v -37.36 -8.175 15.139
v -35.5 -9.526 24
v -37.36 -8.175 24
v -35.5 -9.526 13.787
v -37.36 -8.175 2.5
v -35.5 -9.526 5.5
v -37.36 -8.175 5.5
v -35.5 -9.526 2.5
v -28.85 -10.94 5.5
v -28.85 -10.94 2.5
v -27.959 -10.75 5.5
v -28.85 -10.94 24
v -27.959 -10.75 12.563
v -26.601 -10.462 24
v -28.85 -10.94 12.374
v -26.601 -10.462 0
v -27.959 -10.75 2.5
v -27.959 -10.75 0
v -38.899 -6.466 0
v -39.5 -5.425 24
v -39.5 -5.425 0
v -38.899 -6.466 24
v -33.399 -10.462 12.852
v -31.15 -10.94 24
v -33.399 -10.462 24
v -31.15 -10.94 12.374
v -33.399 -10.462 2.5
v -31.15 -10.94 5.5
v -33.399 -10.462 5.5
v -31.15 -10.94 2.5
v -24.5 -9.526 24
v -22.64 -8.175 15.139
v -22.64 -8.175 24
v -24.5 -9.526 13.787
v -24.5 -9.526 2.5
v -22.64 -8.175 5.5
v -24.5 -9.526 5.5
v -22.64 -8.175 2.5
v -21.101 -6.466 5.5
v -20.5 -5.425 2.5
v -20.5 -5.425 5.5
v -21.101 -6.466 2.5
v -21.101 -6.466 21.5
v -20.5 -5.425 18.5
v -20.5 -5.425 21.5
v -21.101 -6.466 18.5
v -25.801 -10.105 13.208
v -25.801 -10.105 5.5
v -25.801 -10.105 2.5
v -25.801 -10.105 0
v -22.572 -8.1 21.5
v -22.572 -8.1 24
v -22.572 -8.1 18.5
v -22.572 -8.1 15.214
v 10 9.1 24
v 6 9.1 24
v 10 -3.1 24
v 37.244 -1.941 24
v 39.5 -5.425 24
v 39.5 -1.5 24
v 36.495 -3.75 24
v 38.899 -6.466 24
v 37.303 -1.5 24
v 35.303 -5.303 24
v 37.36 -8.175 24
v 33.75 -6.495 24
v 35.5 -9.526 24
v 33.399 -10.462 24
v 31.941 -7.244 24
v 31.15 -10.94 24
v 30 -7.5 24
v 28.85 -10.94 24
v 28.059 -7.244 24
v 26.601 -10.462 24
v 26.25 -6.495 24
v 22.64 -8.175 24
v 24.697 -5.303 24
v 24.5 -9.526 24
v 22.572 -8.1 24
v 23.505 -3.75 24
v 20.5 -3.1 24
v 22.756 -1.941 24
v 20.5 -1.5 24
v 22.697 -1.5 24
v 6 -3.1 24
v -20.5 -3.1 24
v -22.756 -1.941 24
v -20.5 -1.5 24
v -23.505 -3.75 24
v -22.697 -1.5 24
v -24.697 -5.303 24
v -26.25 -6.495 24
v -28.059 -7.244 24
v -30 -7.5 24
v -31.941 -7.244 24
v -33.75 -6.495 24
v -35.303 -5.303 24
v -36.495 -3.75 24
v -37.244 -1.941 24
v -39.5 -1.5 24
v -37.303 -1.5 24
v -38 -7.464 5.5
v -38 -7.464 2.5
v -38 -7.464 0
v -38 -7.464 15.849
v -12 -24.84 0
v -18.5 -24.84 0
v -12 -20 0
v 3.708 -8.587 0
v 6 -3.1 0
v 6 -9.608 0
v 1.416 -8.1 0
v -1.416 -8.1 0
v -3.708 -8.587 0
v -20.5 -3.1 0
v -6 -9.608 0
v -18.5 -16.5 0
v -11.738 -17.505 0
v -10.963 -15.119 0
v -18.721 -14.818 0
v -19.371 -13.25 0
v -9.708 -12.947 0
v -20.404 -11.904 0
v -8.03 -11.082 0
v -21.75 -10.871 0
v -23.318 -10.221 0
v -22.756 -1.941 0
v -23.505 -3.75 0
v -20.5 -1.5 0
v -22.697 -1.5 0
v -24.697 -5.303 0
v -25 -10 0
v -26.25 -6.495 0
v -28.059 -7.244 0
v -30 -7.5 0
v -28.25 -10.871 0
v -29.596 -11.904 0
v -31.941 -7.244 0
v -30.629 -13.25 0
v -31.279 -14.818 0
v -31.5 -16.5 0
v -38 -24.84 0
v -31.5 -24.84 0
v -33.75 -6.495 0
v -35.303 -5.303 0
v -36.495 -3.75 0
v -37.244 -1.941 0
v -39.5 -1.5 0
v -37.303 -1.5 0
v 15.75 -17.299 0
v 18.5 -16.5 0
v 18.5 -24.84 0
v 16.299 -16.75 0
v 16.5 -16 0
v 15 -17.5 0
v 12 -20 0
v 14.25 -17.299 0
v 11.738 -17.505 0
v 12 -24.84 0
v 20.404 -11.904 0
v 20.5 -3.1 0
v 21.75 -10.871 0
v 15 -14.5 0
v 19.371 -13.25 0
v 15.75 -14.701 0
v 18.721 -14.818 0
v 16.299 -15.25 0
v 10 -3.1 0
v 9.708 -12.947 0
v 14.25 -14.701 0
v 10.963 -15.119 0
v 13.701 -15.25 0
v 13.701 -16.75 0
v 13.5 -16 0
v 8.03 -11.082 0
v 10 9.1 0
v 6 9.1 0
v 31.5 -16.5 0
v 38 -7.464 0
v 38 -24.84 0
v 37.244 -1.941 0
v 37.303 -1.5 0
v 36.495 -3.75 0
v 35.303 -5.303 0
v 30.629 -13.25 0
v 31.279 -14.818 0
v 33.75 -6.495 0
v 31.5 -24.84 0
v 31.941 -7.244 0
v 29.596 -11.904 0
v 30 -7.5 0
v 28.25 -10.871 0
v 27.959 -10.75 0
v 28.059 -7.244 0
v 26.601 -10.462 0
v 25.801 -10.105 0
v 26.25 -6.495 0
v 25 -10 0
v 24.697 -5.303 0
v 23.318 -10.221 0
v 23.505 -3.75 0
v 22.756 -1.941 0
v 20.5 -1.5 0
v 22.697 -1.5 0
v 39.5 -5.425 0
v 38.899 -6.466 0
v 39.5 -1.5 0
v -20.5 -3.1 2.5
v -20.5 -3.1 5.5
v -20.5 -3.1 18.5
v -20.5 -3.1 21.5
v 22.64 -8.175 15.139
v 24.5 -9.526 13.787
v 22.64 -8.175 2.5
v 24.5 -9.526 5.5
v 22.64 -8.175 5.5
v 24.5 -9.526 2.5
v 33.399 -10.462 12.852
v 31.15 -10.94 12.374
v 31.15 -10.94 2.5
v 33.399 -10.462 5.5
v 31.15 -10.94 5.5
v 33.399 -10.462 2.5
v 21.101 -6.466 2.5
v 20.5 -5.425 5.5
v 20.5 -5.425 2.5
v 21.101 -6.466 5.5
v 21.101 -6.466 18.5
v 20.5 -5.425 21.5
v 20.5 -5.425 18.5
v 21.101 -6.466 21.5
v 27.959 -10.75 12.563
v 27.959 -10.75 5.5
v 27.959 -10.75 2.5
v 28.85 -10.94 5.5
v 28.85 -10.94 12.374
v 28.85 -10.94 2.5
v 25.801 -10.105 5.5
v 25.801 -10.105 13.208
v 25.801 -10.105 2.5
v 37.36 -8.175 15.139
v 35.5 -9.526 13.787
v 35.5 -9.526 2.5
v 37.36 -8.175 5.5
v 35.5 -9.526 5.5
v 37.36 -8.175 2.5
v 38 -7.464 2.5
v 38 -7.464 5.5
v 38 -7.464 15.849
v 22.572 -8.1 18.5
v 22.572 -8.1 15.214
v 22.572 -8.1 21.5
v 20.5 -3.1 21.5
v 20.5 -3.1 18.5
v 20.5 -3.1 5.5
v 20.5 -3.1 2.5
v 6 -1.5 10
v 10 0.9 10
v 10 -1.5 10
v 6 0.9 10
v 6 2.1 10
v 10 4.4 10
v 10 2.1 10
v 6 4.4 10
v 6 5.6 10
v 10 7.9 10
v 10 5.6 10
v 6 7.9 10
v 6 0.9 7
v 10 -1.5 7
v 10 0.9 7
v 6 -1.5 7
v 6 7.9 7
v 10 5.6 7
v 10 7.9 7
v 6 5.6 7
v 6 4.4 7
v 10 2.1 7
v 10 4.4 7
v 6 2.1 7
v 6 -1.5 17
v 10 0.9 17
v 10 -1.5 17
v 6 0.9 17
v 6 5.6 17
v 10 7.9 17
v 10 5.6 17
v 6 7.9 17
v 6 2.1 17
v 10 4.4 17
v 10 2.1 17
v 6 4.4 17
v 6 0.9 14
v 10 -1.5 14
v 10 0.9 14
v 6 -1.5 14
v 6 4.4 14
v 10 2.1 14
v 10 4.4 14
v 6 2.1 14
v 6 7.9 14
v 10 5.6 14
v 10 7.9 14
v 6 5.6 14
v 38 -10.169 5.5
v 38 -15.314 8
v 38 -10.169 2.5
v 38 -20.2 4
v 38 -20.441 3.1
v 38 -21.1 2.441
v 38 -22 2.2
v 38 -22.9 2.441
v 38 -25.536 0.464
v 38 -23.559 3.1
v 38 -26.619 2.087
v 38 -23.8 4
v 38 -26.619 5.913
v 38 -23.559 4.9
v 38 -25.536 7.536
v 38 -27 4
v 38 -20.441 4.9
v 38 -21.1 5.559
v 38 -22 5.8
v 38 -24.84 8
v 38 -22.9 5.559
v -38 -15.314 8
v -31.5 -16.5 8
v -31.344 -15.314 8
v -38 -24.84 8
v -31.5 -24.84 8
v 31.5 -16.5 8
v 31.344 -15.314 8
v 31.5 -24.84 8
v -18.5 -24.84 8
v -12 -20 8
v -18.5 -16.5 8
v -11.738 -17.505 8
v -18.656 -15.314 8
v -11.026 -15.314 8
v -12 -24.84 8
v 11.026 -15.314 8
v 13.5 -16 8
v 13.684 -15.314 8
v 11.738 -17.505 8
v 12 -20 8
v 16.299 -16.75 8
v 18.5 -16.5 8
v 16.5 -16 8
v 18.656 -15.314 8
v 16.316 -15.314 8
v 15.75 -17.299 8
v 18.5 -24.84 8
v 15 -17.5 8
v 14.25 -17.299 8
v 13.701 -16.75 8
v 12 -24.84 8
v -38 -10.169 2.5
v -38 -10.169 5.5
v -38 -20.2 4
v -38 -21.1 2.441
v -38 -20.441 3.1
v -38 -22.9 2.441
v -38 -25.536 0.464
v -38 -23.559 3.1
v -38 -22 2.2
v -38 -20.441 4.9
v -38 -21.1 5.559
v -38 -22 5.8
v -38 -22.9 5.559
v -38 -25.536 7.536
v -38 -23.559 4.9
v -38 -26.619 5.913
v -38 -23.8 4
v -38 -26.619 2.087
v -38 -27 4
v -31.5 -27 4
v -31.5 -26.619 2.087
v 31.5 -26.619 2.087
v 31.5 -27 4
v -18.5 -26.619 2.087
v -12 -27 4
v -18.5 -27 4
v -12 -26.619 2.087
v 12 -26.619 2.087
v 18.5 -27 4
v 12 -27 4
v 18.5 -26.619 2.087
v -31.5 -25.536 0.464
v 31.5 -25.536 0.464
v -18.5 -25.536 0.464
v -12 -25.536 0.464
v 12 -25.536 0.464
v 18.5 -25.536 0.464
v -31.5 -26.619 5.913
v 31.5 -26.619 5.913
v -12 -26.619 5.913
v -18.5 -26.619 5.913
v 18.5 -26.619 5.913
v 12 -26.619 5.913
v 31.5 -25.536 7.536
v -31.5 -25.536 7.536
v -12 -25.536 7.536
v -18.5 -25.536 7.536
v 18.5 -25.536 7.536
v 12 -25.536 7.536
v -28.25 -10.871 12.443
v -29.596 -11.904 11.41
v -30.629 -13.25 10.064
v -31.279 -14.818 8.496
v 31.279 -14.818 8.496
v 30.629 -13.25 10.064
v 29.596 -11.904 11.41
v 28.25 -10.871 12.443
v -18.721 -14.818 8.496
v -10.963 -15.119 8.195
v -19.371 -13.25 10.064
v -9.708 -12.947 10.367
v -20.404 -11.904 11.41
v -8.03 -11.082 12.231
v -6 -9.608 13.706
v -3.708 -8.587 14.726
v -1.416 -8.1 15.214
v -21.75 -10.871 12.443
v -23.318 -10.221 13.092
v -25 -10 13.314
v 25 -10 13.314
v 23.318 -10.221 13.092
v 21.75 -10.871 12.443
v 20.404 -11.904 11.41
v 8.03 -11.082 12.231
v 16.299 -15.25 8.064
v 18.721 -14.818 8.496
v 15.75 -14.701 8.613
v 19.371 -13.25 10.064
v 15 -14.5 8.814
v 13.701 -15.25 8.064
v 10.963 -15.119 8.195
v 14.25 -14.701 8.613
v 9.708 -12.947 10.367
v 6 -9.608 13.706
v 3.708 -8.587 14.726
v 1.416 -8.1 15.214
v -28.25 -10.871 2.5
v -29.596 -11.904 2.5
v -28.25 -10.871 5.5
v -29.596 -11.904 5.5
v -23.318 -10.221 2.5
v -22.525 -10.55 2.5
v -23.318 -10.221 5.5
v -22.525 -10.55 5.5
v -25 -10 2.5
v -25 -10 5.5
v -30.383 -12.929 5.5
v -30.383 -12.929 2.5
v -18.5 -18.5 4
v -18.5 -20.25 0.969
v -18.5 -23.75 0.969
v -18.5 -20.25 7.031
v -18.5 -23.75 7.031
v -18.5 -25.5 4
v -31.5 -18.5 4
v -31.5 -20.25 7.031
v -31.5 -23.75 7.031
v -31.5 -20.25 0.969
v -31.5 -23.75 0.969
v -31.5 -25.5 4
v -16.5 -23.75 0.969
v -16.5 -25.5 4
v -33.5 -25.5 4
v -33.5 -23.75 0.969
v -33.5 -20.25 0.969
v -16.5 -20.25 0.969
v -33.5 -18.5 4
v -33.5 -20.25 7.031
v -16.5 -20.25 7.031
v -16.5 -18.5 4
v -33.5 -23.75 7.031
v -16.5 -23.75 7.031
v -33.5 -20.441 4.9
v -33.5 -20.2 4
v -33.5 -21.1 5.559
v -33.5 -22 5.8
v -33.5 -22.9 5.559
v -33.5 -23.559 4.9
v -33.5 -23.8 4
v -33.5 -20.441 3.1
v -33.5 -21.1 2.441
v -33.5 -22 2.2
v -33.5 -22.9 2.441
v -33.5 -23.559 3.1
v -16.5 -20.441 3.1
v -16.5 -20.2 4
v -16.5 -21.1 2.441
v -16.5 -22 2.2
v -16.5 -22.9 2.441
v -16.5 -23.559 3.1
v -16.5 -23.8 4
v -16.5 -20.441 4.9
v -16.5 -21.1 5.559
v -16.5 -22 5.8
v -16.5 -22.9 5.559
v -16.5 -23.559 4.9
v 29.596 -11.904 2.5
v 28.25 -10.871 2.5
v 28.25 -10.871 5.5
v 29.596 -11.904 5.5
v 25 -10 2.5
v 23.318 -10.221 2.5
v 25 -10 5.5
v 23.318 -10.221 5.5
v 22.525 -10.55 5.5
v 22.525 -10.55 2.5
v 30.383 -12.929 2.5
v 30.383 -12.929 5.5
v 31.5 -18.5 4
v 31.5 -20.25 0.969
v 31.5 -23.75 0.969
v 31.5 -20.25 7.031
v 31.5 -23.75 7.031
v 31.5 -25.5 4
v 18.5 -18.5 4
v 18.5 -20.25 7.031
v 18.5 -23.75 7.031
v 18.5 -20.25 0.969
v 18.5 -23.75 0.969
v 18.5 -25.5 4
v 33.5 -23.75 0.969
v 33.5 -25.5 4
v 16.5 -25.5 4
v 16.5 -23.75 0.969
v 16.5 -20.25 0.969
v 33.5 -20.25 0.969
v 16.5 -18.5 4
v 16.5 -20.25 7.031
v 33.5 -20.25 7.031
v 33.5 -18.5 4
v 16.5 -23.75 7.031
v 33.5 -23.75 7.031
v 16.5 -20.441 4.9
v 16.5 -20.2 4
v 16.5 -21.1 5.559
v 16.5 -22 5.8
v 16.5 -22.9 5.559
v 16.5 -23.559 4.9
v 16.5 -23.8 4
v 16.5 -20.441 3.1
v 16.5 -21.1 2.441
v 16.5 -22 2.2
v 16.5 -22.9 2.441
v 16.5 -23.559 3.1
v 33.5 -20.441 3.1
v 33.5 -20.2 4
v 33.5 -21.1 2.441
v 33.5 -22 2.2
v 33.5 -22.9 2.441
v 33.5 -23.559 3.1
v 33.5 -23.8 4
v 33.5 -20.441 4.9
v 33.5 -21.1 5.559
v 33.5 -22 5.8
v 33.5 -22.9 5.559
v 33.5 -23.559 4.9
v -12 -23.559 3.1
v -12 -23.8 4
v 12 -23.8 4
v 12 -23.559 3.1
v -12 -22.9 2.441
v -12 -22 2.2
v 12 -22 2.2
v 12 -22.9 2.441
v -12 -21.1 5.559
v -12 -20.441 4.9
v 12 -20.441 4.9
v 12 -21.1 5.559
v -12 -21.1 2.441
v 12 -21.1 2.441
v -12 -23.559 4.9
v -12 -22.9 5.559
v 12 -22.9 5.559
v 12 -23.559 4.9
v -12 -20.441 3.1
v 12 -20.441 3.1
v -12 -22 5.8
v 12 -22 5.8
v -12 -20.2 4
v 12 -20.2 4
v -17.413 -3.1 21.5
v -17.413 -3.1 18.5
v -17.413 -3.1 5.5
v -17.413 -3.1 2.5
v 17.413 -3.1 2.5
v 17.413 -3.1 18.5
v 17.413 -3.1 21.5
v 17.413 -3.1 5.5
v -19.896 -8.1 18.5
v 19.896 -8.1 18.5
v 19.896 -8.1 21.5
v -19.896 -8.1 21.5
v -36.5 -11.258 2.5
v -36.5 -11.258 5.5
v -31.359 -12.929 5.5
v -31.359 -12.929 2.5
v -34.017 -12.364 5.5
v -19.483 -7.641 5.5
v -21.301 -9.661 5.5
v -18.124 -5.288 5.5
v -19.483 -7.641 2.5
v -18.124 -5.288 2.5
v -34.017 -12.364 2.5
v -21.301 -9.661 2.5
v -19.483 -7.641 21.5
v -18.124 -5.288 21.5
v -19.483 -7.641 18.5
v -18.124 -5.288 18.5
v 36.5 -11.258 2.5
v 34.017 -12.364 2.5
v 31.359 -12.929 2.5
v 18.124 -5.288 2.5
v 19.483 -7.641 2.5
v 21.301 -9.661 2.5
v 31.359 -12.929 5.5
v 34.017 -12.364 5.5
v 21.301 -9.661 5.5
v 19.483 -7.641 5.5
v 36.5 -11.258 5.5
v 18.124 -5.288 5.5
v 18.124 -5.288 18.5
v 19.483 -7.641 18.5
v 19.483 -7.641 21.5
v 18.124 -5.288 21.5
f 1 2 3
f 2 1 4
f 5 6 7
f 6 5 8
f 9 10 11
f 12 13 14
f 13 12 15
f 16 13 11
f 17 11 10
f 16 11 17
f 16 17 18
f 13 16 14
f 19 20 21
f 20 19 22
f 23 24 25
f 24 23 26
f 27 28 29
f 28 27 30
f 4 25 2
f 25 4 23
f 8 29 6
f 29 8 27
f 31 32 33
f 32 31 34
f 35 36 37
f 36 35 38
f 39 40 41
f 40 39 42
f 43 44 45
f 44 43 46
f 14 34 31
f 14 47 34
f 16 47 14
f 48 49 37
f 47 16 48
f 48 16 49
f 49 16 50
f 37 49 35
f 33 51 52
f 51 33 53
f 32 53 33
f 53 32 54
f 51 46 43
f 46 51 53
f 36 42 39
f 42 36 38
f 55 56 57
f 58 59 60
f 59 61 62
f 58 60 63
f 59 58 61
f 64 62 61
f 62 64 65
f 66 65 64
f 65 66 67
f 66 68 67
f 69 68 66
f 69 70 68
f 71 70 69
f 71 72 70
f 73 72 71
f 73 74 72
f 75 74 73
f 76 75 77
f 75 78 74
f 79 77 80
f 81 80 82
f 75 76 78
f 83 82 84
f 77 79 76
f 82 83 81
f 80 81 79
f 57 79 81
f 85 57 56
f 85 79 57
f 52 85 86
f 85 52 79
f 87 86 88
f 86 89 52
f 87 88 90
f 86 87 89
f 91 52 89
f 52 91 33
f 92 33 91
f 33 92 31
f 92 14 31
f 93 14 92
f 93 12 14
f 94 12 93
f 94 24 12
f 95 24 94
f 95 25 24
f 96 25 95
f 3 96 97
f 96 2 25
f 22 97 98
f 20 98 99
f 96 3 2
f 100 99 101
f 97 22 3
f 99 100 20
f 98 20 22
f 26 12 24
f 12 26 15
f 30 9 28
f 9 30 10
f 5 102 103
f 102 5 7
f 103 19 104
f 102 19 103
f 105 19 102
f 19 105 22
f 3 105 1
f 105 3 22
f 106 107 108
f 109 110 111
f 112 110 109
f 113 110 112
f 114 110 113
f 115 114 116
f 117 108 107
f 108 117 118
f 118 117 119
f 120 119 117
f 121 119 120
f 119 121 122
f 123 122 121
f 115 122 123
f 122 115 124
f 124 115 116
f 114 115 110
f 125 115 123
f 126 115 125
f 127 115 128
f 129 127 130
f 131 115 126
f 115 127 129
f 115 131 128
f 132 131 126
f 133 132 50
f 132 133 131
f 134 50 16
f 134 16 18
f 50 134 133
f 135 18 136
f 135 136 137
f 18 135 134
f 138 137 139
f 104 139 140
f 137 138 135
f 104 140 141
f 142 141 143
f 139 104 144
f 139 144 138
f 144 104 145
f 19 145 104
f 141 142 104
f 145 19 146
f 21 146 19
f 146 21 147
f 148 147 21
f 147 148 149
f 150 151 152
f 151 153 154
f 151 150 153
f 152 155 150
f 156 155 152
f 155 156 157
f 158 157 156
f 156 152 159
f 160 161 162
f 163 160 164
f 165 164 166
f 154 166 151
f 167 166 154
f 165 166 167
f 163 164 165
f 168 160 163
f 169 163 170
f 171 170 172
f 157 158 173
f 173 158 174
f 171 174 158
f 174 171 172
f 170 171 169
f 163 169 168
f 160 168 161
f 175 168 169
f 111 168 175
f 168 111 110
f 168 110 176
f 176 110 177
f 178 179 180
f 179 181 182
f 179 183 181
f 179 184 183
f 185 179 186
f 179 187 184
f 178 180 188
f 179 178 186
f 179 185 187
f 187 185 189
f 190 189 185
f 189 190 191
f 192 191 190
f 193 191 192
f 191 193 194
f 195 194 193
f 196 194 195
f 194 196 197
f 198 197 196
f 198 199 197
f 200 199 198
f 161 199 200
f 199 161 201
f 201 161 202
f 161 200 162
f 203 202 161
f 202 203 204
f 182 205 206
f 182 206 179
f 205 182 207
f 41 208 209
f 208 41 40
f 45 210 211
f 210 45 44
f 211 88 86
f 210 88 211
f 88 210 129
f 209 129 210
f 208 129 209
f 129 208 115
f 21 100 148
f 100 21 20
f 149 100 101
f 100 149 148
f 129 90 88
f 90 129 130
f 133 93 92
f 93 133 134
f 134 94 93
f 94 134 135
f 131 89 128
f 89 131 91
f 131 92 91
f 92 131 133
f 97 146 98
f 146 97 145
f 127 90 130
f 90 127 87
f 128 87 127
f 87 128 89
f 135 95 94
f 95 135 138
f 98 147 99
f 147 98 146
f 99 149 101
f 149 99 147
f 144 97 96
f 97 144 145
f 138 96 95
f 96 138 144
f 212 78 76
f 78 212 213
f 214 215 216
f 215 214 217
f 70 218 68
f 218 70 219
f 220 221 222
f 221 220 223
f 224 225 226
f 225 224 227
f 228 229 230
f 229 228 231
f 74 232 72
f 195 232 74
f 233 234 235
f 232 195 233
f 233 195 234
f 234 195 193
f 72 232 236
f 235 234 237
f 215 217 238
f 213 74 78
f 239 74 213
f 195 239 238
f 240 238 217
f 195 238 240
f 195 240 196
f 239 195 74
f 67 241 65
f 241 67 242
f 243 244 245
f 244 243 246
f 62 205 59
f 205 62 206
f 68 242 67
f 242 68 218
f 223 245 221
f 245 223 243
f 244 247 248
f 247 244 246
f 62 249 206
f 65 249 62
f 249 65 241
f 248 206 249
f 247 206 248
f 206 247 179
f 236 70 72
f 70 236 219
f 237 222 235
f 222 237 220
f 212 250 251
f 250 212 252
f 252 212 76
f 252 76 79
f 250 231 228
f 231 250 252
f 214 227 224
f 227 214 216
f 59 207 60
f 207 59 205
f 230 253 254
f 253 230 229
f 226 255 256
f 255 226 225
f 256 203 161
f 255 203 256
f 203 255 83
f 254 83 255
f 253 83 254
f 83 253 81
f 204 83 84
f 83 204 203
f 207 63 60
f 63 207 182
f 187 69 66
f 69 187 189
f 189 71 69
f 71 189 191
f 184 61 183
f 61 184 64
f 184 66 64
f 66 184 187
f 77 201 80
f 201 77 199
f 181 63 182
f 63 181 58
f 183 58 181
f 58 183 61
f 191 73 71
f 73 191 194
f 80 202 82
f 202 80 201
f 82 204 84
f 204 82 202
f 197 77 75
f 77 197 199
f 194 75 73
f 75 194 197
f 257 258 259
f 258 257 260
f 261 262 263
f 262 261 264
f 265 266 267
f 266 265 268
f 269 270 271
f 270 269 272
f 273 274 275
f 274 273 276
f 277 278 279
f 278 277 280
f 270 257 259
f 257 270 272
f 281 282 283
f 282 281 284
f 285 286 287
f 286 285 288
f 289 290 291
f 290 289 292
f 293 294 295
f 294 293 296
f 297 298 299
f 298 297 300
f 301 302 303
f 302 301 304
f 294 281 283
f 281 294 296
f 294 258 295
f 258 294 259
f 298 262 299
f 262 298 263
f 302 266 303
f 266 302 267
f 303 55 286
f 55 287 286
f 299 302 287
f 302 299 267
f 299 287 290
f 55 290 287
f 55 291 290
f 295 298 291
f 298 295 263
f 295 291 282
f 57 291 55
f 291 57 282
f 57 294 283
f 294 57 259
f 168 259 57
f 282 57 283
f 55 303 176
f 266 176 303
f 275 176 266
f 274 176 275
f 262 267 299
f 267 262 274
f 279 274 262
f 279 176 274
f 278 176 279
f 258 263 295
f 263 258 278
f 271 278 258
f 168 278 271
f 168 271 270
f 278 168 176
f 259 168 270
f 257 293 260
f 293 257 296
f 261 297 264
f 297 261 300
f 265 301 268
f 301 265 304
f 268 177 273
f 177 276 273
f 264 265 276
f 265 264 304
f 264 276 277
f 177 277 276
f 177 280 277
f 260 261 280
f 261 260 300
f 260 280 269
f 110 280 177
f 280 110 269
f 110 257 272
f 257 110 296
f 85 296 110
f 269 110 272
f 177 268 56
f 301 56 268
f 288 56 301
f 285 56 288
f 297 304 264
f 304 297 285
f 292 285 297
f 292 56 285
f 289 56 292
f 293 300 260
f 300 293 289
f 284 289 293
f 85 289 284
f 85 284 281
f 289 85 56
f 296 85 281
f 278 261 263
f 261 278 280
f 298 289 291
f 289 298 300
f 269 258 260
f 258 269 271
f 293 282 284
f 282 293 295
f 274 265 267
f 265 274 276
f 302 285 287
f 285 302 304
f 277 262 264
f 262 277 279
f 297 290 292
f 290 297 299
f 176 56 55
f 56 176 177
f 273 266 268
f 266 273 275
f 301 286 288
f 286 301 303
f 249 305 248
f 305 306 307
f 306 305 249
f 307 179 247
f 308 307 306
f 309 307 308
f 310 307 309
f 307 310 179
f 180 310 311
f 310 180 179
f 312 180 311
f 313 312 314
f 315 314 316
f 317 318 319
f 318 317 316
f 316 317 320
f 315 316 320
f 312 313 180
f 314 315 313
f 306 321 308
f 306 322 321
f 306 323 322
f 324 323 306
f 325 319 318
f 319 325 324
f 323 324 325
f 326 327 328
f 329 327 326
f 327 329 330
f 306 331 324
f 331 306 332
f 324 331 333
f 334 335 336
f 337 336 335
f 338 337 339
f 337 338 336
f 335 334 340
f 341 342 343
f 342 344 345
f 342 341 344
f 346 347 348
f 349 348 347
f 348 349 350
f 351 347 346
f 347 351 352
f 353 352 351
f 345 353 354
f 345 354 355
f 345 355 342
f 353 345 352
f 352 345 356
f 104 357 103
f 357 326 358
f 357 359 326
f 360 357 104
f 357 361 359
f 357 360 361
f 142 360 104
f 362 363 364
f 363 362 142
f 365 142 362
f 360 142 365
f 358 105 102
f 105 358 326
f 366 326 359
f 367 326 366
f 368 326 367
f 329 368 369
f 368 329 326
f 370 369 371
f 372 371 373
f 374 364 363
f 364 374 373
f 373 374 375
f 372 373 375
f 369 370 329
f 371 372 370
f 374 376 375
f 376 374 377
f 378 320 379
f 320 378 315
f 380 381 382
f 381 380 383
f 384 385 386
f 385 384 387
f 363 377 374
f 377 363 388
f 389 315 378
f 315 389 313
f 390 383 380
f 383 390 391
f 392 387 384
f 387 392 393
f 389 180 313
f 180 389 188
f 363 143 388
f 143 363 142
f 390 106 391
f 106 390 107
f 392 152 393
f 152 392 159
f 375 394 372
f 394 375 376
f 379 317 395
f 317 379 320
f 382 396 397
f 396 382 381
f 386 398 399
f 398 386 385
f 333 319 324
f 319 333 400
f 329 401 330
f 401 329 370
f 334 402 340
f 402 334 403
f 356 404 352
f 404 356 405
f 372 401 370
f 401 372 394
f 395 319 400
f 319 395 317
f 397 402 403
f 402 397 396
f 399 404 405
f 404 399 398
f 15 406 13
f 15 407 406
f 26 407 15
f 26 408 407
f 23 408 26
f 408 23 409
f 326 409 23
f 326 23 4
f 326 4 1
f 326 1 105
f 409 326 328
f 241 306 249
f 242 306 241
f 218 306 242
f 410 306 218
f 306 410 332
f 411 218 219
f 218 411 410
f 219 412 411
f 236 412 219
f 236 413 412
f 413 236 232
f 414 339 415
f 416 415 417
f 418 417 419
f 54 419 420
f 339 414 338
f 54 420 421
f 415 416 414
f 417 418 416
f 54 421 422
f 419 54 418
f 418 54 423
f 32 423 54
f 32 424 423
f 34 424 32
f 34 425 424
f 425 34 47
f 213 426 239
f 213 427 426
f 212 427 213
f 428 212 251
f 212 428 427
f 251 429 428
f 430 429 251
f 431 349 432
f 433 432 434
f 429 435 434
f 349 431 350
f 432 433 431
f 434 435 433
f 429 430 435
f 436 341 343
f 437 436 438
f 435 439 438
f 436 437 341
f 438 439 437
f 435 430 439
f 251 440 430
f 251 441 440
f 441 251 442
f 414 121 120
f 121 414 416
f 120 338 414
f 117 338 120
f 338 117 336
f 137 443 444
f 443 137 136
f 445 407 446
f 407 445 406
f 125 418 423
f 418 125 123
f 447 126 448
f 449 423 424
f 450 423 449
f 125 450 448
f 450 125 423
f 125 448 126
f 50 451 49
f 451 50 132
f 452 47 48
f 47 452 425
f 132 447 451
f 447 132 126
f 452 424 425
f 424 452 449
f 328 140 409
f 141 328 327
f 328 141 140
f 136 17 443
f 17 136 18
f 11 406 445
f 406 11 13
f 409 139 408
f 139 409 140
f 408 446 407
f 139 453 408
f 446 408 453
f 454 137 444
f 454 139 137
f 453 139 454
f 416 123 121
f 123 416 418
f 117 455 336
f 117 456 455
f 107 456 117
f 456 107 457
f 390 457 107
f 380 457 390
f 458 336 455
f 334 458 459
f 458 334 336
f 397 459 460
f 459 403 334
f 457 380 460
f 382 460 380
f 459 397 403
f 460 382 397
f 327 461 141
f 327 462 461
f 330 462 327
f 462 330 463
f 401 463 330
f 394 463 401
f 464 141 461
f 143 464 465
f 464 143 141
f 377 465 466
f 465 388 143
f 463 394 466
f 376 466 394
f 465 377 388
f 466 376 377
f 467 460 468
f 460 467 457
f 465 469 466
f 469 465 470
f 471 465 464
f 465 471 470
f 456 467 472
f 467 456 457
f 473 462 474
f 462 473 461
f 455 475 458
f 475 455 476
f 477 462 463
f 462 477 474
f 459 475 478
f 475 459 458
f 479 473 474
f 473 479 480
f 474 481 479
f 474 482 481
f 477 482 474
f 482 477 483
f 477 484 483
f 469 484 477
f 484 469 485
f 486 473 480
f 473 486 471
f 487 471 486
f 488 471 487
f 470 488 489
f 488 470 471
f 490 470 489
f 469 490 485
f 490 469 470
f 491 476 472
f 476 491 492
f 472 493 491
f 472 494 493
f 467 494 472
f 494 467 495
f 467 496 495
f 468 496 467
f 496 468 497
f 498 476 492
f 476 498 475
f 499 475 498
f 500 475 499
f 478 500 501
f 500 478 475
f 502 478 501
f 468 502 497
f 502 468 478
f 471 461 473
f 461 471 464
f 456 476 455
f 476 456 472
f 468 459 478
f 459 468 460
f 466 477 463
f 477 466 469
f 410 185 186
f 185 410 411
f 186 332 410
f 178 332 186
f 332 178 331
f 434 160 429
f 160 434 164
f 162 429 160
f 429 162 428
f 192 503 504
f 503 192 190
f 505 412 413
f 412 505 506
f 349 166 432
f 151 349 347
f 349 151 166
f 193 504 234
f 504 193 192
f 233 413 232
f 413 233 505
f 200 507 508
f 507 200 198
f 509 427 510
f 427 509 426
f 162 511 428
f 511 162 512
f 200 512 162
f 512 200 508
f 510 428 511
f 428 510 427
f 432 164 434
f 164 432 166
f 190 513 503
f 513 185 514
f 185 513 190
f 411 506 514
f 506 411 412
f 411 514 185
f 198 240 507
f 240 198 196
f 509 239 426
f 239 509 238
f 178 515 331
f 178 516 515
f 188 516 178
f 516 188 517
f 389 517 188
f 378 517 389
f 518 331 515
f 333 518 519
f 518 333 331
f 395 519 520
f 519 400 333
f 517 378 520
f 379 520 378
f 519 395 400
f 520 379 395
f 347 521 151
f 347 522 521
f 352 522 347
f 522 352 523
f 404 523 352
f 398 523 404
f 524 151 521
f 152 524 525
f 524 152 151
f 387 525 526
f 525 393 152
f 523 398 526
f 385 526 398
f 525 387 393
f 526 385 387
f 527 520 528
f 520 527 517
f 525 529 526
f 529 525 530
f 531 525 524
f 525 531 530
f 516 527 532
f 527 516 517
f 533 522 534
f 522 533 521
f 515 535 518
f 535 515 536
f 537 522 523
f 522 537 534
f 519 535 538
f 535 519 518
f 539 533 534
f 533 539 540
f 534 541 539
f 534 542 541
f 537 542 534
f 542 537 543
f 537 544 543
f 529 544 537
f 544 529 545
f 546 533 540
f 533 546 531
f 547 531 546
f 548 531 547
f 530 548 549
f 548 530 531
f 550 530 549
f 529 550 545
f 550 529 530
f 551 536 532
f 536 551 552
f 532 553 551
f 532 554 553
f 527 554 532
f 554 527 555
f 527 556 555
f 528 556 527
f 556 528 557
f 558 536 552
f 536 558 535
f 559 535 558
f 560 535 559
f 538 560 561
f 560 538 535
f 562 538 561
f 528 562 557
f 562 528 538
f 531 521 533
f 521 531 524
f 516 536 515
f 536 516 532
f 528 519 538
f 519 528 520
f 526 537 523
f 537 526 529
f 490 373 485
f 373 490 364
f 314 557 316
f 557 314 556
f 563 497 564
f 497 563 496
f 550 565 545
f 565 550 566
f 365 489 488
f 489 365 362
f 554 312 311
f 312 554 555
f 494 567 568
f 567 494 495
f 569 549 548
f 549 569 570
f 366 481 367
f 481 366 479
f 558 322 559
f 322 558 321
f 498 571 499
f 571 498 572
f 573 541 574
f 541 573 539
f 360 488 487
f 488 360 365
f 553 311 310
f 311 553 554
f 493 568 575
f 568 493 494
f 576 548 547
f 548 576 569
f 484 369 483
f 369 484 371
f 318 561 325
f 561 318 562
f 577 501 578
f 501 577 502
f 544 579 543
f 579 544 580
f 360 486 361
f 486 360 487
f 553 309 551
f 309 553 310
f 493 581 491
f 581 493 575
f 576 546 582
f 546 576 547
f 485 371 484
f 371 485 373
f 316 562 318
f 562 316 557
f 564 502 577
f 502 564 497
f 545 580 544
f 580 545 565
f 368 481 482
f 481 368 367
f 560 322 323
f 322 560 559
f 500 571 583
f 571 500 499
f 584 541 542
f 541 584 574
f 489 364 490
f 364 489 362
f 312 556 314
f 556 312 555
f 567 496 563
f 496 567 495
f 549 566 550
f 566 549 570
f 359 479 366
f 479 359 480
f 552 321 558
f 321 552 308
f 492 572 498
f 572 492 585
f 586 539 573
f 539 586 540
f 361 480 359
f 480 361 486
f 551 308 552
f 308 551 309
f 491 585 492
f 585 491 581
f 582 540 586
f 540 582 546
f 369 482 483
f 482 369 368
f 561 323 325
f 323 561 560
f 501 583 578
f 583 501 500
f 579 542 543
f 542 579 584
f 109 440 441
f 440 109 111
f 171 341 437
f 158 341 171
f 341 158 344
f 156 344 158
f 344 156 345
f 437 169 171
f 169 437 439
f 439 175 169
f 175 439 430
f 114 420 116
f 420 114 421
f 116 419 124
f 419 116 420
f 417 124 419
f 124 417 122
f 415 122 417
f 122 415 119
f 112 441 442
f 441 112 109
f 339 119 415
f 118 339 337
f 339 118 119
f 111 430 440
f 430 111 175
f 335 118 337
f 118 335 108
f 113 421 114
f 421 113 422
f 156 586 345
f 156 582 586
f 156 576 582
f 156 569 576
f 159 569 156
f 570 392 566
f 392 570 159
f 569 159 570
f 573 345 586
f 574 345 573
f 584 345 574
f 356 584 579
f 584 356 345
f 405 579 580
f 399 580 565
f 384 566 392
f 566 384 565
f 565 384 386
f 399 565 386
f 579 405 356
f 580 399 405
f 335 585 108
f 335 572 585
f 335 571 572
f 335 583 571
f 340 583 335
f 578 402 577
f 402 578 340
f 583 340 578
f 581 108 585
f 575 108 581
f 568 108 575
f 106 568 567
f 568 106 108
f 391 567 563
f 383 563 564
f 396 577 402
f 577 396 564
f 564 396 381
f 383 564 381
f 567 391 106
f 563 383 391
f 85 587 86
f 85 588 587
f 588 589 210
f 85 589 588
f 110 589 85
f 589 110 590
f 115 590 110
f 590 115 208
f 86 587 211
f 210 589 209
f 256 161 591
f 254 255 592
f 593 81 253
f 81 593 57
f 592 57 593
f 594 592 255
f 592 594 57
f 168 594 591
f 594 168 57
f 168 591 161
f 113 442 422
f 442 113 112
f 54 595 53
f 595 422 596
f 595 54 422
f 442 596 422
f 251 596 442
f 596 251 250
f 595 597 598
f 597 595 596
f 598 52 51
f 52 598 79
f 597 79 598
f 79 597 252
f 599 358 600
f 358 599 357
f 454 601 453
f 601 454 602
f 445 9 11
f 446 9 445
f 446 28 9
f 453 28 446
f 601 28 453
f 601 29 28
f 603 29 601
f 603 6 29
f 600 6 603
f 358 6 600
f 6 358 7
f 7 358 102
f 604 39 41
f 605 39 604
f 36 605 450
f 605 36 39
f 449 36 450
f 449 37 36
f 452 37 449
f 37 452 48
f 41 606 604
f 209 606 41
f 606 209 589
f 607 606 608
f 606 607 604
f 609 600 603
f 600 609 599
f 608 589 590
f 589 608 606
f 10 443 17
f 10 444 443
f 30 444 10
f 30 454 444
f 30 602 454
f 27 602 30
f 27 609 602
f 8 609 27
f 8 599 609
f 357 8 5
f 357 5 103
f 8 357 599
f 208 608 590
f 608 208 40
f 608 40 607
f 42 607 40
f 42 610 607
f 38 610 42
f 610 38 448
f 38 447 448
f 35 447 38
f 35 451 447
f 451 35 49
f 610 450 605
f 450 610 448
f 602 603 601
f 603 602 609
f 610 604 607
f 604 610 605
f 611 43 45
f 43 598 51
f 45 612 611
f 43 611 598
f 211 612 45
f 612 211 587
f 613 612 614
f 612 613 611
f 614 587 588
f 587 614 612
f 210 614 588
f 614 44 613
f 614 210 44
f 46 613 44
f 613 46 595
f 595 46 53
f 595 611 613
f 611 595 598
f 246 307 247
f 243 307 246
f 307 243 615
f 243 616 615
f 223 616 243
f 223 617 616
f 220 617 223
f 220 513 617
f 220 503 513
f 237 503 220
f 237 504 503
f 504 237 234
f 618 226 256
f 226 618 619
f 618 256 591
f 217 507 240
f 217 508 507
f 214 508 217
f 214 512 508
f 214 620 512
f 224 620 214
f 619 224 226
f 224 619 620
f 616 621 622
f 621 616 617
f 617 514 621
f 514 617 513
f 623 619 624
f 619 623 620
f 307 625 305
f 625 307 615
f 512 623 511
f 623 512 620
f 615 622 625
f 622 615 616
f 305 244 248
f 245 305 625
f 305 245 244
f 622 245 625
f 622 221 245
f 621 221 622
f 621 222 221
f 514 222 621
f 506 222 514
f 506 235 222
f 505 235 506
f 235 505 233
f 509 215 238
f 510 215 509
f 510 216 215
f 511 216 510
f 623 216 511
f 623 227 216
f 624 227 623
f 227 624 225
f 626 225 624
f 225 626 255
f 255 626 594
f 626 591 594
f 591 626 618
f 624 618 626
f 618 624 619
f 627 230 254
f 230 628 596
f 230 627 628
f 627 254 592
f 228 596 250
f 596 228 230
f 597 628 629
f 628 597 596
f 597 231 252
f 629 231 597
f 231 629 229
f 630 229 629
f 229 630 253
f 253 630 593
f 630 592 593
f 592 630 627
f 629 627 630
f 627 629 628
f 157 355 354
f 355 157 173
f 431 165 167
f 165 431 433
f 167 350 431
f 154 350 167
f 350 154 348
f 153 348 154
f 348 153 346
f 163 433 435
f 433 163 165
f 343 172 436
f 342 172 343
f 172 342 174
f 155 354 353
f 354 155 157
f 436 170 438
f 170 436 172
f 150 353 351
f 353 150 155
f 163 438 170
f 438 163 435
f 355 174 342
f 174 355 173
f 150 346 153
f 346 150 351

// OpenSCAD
// file: configuration.scad
motor_end_height=44;
idler_end_height=28;
carriage_height=24;
platform_thickness=8;
bed_thickness=12;
pcb_thickness=2;
rod_length=120;
smooth_rod_length=300;
tower_radius = 120;
platform_hinge_offset=33;
carriage_hinge_offset=22;

m3_bolt_hole_radius = 1.8;
m3_nut_radius = 3.5;
// main file
include <configuration.scad>

width = 76;
height = carriage_height;

offset = 25;
cutout = 13;
middle = 2*offset - width/2;


module parallel_joints(reinforced) {
  difference() {
    union() {
	  intersection() {
        cube([width, 20, 8], center=true);
        rotate([0, 90, 0]) cylinder(r=5, h=width, center=true);
      }
      intersection() {
        translate([0, 18, 4]) rotate([45, 0, 0])
          cube([width, reinforced, reinforced], center=true);
        translate([0, 0, 20]) cube([width, 35, 40], center=true);
      }
      translate([0, 8, 0]) cube([width, 16, 8], center=true);
    }
    rotate([0, 90, 0]) cylinder(r=m3_bolt_hole_radius, h=80, center=true, $fn=12);

    for (x = [-offset, offset]) {
      translate([x, 5.5, 0])
        cylinder(r=cutout/2, h=100, center=true, $fn=24);
      translate([x, -4.5, 0])
        cube([cutout, 20, 100], center=true);
      translate([x, 0, 0]) rotate([0, 90, 0]) rotate([0, 0, 30])
        cylinder(r=m3_nut_radius, h=17, center=true, $fn=6);
    }
    translate([0, 2, 0]) cylinder(r=middle, h=100, center=true);
    translate([0, -8, 0]) cube([2*middle, 20, 100], center=true);
  }
}

module lm8uu_mount(d, h) {
  union() {
    difference() {
      intersection() {
        cylinder(r=11, h=h, center=true);
        translate([0, -8, 0]) cube([19, 13, h+1], center=true);
      }
      cylinder(r=d/2, h=h+1, center=true);
    }
  }
}

module belt_mount() {
  difference() {
    union() {
      difference() {
        translate([8, 2, 0]) cube([4, 13, height], center=true);
        for (z = [-3.5, 3.5])
          translate([8, 5, z])
            cube([5, 13, 3], center=true);
      }
      for (y = [1.5, 5, 8.5]) {
        translate([8, y, 0]) cube([4, 1.2, height], center=true);
      }
    }
  }
}

module carriage() {
  translate([0, 0, height/2]) 
  union() {
    for (x = [-30, 30]) {
      translate([x, 0, 0]) lm8uu_mount(d=15, h=24);
    }
    belt_mount();
    difference() {
      union() {
        translate([0, -5.6, 0])
          cube([50, 5, height], center=true);
        translate([0, -carriage_hinge_offset, -height/2+4])
          parallel_joints(16);
      }
      // Screw hole for adjustable top endstop.
      translate([15, -16, -height/2+4])
        cylinder(r=1.5, h=20, center=true, $fn=12);
      for (x = [-30, 30]) {
        translate([x, 0, 0])
          cylinder(r=8, h=height+1, center=true);
        // Zip tie tunnels.
        for (z = [-height/2+4, height/2-4])
          translate([x, 0, z])
            cylinder(r=13, h=3, center=true);
      }
    }
  }
}

carriage();

// Uncomment the following lines to check endstop alignment.
// use <idler_end.scad>;
// translate([0, 0, -20]) rotate([180, 0, 0]) idler_end();
